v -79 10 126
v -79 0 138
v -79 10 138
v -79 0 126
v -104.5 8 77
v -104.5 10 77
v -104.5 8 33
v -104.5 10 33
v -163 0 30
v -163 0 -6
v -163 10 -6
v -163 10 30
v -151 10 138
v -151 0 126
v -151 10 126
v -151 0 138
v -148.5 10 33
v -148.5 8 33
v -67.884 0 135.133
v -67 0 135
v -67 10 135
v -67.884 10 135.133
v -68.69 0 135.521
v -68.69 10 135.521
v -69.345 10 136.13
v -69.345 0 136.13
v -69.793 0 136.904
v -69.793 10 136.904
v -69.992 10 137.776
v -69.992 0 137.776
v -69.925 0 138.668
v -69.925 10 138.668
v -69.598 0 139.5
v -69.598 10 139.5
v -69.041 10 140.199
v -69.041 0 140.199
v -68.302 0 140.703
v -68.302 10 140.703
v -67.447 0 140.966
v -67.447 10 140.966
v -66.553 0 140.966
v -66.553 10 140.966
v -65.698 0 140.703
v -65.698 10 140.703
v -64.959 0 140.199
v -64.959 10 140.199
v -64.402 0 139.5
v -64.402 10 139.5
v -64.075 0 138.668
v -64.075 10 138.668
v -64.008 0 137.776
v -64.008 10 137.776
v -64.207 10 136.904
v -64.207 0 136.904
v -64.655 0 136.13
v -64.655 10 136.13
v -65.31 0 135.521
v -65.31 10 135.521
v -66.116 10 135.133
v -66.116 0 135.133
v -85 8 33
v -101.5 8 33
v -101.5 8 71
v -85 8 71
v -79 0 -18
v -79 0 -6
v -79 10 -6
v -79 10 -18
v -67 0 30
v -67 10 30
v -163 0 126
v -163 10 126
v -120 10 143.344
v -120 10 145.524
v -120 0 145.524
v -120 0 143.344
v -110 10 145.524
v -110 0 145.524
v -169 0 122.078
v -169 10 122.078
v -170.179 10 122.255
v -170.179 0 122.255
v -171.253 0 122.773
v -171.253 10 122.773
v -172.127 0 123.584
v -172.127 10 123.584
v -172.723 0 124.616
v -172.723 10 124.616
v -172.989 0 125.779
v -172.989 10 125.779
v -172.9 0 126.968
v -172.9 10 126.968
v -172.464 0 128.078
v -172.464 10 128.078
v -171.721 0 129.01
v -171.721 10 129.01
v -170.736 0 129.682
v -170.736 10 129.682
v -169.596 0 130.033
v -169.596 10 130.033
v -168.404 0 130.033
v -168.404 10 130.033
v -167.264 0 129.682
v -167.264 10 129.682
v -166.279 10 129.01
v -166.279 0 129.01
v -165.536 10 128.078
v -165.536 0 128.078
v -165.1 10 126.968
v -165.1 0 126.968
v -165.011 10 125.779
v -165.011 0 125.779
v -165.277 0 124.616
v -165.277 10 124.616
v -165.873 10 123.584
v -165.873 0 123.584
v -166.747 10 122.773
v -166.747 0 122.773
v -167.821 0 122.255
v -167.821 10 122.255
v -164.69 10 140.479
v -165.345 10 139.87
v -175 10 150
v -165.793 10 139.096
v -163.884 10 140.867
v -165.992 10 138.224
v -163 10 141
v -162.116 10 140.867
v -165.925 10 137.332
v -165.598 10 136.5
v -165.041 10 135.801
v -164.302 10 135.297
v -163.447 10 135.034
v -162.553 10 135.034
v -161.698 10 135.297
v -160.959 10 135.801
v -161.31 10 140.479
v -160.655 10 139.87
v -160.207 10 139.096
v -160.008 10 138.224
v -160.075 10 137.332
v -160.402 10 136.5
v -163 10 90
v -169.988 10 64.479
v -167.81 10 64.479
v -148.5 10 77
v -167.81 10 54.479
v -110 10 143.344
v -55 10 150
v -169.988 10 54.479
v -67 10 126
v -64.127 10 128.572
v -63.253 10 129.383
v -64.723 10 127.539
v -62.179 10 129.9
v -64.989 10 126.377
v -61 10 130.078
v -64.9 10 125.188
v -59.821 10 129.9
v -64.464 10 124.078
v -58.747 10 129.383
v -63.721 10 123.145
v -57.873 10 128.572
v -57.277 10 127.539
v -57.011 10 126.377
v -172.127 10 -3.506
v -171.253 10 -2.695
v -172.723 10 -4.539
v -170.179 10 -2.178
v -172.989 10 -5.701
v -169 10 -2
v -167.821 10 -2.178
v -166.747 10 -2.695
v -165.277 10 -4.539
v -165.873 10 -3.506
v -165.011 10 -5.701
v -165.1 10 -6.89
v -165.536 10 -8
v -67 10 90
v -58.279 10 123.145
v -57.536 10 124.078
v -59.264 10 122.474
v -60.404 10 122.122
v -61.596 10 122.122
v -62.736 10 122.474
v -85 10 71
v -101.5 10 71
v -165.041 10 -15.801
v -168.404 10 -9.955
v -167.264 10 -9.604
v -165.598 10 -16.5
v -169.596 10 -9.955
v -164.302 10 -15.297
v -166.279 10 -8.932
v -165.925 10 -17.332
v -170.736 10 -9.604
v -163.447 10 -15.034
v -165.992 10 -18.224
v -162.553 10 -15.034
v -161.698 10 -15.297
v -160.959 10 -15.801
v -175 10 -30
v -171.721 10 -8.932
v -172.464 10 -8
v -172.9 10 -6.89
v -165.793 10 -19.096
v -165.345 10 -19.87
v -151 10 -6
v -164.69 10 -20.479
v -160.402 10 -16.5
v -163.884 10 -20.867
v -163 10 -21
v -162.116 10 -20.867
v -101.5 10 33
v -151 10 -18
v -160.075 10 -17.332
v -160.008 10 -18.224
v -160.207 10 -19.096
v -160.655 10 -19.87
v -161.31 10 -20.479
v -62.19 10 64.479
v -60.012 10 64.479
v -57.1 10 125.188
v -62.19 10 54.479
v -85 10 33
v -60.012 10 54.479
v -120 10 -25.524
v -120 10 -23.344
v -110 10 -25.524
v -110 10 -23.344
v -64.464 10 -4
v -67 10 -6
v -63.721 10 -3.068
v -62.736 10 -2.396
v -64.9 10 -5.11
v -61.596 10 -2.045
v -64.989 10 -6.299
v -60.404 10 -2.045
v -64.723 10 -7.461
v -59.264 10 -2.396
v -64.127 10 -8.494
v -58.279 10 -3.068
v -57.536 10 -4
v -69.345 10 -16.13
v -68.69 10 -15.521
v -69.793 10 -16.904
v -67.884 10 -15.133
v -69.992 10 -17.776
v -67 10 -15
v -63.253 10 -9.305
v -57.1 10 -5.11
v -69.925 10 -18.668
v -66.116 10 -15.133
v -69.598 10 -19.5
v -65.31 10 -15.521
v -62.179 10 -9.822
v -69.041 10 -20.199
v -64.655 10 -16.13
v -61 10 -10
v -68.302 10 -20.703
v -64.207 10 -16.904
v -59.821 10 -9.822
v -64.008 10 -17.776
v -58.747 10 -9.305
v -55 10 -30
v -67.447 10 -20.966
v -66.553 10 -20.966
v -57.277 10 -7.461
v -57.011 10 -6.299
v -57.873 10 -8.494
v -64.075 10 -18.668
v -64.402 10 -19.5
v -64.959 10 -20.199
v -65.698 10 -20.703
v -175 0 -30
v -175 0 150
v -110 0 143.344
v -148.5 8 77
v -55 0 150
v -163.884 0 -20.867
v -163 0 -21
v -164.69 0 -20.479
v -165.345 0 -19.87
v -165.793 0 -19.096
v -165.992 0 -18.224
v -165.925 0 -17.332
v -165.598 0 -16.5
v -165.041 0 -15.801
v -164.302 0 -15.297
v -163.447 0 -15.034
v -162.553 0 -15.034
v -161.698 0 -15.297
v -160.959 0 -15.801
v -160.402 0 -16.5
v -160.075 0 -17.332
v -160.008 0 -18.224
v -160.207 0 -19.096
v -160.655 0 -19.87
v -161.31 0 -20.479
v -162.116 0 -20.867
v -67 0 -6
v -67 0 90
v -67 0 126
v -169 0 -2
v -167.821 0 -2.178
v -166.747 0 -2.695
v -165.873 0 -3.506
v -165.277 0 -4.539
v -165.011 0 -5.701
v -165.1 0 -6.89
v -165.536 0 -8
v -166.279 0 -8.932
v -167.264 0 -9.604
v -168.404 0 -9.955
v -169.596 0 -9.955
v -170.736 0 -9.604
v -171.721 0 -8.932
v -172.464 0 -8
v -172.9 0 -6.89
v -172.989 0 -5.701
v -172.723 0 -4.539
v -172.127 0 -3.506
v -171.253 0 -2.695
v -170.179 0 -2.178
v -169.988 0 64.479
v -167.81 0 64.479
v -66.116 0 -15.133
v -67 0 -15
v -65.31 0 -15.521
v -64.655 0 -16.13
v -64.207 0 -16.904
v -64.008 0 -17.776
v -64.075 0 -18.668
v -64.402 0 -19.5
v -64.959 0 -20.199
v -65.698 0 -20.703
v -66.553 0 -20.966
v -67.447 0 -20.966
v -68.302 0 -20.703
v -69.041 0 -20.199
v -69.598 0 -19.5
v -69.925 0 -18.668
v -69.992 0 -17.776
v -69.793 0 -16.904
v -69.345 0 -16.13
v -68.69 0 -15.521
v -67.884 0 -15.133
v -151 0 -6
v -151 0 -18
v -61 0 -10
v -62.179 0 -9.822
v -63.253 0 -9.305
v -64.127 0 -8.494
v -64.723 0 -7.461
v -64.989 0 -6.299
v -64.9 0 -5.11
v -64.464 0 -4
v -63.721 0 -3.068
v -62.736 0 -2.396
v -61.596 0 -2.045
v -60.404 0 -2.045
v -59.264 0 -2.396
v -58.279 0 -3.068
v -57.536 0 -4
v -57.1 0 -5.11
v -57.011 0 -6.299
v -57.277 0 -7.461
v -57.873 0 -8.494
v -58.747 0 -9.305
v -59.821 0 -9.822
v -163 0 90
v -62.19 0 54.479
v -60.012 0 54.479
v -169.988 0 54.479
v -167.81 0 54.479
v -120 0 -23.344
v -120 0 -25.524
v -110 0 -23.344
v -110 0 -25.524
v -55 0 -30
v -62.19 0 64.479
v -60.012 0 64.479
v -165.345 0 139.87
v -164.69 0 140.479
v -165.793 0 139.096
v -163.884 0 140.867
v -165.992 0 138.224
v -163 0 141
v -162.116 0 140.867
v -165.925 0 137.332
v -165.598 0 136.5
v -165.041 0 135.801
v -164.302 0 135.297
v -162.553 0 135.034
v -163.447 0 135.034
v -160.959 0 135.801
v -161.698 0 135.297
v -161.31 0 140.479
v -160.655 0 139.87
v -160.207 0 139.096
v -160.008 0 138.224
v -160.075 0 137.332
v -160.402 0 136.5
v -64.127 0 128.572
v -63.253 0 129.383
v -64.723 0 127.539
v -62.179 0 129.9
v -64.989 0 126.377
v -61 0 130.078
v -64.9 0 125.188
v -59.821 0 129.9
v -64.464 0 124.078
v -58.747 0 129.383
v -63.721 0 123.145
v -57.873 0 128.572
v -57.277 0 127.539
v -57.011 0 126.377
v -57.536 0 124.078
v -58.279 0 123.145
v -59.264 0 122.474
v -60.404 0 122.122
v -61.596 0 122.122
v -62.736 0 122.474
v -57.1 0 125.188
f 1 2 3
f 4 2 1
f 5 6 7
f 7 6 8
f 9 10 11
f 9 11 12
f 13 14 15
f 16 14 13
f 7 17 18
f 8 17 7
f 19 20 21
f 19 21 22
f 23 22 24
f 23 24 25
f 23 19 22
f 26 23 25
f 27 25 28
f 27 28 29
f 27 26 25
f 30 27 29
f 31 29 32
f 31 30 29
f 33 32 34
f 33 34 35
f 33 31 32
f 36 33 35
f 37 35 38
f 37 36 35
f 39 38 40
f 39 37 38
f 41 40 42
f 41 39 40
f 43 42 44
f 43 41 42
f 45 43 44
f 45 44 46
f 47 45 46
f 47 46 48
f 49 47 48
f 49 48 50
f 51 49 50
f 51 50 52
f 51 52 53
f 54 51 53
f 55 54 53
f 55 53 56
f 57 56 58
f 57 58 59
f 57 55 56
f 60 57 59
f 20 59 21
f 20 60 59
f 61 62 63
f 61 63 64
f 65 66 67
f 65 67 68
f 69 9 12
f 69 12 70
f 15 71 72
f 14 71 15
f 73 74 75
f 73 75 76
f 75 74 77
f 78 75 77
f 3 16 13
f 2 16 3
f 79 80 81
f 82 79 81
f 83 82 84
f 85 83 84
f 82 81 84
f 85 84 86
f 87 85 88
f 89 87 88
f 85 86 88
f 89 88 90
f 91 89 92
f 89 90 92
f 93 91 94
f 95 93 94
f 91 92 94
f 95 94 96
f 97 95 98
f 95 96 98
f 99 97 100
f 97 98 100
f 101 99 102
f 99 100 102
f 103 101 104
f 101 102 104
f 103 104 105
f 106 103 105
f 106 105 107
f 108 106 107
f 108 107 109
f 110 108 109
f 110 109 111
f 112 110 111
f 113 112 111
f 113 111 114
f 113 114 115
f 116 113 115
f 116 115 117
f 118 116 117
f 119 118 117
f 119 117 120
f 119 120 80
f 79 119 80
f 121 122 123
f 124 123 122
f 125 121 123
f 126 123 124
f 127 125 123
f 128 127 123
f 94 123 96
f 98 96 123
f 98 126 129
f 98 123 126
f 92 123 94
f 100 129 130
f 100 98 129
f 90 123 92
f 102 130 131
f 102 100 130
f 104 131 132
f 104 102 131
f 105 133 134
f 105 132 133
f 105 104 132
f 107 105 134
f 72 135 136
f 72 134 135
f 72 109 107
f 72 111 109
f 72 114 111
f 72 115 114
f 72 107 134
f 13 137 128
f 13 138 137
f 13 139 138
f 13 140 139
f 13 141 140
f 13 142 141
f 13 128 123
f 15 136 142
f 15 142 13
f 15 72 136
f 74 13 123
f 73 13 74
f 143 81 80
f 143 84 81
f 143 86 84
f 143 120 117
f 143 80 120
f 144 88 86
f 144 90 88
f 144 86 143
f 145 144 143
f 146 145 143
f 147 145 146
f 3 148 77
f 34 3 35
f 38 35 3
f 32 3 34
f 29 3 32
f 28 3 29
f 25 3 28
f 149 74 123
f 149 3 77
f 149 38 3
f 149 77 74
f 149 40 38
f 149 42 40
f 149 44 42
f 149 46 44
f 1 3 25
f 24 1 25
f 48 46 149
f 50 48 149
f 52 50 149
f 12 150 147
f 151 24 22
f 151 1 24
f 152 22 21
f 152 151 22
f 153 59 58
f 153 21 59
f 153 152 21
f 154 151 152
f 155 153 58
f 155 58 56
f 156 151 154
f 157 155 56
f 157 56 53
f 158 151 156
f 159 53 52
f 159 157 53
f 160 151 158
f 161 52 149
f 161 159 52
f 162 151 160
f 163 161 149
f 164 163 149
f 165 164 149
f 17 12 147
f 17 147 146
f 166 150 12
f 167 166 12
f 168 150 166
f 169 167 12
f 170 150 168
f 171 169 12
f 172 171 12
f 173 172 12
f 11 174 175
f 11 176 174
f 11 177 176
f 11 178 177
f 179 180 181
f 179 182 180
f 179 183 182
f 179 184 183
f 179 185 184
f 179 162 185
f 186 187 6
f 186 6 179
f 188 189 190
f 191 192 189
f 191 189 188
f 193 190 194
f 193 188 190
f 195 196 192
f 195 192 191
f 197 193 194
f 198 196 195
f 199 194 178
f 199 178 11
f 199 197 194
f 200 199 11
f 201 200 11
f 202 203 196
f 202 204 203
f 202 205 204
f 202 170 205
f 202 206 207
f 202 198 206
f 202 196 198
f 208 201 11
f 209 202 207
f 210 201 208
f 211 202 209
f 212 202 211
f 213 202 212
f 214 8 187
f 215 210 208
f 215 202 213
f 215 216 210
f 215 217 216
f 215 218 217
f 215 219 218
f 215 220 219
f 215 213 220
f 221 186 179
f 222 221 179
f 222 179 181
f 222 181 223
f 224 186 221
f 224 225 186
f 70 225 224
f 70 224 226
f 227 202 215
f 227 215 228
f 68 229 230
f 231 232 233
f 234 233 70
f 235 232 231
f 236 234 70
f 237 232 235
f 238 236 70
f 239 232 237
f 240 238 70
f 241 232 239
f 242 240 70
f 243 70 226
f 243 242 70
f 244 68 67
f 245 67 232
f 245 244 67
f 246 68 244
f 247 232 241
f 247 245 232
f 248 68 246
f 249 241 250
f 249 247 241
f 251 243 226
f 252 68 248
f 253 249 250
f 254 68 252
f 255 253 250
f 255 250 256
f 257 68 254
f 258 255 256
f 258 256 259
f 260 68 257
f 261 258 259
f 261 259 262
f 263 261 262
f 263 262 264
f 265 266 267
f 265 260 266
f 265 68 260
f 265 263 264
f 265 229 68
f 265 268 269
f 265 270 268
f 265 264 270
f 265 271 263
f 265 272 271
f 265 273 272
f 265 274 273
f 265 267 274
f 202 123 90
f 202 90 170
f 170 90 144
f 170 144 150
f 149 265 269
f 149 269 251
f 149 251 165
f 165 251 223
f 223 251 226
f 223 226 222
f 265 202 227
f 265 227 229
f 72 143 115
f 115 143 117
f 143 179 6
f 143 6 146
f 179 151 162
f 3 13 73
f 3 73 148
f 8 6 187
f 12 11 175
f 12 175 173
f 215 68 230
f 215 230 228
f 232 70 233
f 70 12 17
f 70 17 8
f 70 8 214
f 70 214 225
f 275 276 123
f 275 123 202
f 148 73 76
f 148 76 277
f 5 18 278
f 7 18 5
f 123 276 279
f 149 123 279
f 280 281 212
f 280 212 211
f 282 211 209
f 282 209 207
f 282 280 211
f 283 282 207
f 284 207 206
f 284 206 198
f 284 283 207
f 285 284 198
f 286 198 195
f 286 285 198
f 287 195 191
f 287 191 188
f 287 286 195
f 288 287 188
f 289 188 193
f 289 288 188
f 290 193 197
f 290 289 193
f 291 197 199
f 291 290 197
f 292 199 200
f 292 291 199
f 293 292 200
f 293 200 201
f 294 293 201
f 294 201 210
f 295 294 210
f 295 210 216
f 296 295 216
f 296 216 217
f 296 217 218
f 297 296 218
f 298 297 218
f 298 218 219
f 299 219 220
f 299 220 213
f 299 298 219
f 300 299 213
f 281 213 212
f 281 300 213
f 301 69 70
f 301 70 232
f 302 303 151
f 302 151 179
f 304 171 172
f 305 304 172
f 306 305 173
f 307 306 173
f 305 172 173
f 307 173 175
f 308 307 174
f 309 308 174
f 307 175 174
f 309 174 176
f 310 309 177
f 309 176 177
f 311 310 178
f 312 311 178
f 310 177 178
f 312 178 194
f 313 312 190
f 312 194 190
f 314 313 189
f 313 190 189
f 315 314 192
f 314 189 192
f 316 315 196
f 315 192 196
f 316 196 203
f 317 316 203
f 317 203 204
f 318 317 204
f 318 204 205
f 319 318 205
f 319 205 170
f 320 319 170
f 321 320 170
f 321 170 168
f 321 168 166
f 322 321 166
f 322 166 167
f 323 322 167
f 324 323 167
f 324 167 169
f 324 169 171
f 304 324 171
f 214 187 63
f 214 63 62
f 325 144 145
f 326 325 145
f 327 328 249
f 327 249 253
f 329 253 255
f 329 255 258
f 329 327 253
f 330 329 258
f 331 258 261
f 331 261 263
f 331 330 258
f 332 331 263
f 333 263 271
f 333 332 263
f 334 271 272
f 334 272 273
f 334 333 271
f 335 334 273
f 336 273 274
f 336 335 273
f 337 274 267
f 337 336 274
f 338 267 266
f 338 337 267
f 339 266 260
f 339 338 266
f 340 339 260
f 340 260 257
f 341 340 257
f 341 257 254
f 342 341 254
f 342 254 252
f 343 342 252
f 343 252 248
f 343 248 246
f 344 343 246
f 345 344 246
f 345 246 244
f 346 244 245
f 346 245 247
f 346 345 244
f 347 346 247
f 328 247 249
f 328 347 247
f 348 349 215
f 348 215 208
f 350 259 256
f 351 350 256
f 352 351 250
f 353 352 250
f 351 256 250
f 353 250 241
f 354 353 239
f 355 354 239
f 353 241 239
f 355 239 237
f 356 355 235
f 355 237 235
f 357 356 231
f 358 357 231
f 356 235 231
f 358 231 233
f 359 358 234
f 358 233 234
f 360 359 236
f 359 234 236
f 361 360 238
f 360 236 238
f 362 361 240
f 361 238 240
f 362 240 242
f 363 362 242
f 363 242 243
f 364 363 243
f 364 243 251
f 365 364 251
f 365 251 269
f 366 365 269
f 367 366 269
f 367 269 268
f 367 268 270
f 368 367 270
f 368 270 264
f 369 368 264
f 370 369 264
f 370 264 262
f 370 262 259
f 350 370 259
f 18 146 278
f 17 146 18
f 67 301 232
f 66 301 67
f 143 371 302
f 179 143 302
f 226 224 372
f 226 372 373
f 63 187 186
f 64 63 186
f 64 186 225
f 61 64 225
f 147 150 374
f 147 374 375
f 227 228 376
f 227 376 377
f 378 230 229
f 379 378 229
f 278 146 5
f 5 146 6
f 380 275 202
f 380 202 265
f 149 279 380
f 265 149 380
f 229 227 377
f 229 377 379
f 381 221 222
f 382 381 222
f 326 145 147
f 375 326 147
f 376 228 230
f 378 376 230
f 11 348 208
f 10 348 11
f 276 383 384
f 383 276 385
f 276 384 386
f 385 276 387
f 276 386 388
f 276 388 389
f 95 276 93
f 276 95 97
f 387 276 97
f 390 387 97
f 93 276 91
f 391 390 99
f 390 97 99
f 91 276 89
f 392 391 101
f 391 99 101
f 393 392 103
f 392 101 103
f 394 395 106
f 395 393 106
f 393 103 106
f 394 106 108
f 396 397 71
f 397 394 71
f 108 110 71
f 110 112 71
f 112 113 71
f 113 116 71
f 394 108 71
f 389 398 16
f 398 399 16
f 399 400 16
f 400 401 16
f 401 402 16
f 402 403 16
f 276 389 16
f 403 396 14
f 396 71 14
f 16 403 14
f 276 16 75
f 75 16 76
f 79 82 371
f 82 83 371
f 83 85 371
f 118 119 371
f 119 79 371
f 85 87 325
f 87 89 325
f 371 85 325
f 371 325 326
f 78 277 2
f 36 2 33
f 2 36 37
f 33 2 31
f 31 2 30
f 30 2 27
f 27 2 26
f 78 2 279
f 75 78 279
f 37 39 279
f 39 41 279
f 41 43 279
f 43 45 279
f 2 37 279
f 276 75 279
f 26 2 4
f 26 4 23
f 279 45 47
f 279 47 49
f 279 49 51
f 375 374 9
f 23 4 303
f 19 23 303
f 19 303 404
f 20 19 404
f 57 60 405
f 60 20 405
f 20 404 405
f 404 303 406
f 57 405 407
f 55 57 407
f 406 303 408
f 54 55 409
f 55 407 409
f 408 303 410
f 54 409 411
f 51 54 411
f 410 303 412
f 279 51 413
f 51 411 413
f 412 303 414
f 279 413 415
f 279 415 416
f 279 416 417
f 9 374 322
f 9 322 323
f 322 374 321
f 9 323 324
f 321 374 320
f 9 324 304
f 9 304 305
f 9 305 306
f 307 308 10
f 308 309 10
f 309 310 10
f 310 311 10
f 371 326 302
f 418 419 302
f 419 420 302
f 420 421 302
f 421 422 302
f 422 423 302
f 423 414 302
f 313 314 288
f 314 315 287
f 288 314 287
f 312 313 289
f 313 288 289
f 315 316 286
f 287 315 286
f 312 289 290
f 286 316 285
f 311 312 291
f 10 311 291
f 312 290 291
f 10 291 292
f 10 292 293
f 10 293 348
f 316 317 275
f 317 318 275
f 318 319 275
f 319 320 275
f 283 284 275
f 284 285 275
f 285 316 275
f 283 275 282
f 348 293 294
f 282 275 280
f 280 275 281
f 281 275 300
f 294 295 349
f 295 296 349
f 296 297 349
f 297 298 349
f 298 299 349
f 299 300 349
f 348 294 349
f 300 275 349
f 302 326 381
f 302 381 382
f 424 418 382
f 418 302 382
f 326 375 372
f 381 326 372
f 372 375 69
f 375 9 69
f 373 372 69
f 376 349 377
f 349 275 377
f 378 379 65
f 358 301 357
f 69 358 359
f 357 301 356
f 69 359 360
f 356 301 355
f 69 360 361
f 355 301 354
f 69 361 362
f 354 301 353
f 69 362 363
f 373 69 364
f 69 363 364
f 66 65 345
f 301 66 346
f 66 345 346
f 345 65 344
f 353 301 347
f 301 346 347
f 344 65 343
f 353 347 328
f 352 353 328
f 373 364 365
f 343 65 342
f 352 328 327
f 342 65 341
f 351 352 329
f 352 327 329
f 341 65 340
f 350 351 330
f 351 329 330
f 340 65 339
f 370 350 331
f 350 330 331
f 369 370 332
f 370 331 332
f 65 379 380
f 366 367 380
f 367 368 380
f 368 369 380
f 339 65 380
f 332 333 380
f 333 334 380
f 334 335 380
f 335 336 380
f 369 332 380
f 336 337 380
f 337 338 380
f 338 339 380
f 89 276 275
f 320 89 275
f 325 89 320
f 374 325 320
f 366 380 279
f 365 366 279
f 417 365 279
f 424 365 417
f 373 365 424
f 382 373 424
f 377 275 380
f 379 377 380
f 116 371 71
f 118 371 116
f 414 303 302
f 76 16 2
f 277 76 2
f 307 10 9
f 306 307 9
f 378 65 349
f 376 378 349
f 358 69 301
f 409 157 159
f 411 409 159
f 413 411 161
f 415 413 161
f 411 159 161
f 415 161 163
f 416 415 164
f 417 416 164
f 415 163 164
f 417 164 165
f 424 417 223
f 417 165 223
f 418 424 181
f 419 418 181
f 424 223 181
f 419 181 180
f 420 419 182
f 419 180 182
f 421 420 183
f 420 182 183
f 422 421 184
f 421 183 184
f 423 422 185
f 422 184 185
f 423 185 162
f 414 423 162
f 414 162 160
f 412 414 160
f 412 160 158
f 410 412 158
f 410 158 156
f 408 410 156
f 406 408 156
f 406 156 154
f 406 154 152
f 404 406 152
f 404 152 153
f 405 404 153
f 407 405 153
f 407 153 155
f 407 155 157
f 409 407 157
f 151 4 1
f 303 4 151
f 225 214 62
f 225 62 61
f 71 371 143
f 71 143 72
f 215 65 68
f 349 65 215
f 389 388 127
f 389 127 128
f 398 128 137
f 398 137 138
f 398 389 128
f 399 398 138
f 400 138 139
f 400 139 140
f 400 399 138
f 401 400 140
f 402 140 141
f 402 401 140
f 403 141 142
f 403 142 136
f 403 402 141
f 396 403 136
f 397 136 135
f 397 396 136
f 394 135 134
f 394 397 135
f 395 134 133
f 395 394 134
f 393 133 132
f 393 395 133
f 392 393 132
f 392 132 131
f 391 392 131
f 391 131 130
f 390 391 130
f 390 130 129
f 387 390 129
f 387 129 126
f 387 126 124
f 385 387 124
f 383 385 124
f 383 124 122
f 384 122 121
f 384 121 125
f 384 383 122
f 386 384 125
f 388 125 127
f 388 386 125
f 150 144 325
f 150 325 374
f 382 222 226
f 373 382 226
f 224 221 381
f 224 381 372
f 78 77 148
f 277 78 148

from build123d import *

# Parameters (mm, degrees)
SKETCH1_W           = 120
SKETCH1_H           = 180
SKETCH1_R           = 3
BOSS_EXTRUDE1_DEPTH = 10
SKETCH2_W           = 96
SKETCH2_H           = 60
BOSS_EXTRUDE2_DEPTH = 10
SKETCH8_R           = 4
SKETCH8_W           = 2.177957771
SKETCH8_H           = 10
SKETCH8_W_2         = 10
SKETCH8_H_2         = 2.18
CUT_EXTRUDE8_DEPTH  = 231.705439901
SKETCH7_W           = 16.5
SKETCH7_H           = 38
CUT_EXTRUDE7_DEPTH  = 2
SKETCH5_W           = 44
SKETCH5_H           = 44
CUT_EXTRUDE5_DEPTH  = 2


with BuildPart() as part:
    # Sketch1 → Boss-Extrude1 (new body)
    with BuildSketch(Plane(origin=(0, 0, 0), x_dir=(1, 0, 0), z_dir=(0, 1, 0))):
        with Locations((-115, -60)):
            Rectangle(SKETCH1_W, SKETCH1_H)
        with Locations(Location((-163, -138, 0), (0, 0, 270))):
            Circle(SKETCH1_R, mode=Mode.SUBTRACT)
        with Locations(Location((-67, -138, 0), (0, 0, 90))):
            Circle(SKETCH1_R, mode=Mode.SUBTRACT)
        with Locations(Location((-163, 18, 0), (0, 0, 90))):
            Circle(SKETCH1_R, mode=Mode.SUBTRACT)
        with Locations(Location((-67, 18, 0), (0, 0, 270))):
            Circle(SKETCH1_R, mode=Mode.SUBTRACT)
        Polygon((-163, 6), (-163, -126), (-151, -126), (-151, -138), (-79, -138), (-79, -126), (-67, -126), (-67, 6), (-79, 6), (-79, 18), (-151, 18), (-151, 6), align=None, mode=Mode.SUBTRACT)
    extrude(amount=BOSS_EXTRUDE1_DEPTH)

    # Sketch2 → Boss-Extrude2 (add)
    with BuildSketch(Plane(origin=(0, 0, 0), x_dir=(1, 0, 0), z_dir=(0, 1, 0))):
        with Locations((-115, -60)):
            Rectangle(SKETCH2_W, SKETCH2_H)
    extrude(amount=BOSS_EXTRUDE2_DEPTH)

    # Sketch8 → Cut-Extrude8 (cut, through all)
    with BuildSketch(Plane(origin=(0, 10, 0), x_dir=(1, 0, 0), z_dir=(0, 1, 0))):
        with Locations(Location((-169, 6, 0), (0, 0, 270))):
            Circle(SKETCH8_R)
        with Locations(Location((-169, -126.077692428, 0), (0, 0, 90))):
            Circle(SKETCH8_R)
        with Locations(Location((-61, -126.077692428, 0), (0, 0, 270))):
            Circle(SKETCH8_R)
        with Locations(Location((-61, 6, 0), (0, 0, 90))):
            Circle(SKETCH8_R)
        with Locations((-168.898595302, -59.479320644)):
            Rectangle(SKETCH8_W, SKETCH8_H)
        with Locations((-115, 24.434155691)):
            Rectangle(SKETCH8_W_2, SKETCH8_H_2)
        with Locations((-61.101404698, -59.479320644)):
            Rectangle(SKETCH8_W, SKETCH8_H)
        with Locations((-115, -144.434155691)):
            Rectangle(SKETCH8_W_2, SKETCH8_H_2)
    extrude(amount=-CUT_EXTRUDE8_DEPTH, mode=Mode.SUBTRACT)

    # Sketch7 → Cut-Extrude7 (cut)
    with BuildSketch(Plane(origin=(0, 10, 0), x_dir=(1, 0, 0), z_dir=(0, 1, 0))):
        with Locations((-93.25, -52)):
            Rectangle(SKETCH7_W, SKETCH7_H)
    extrude(amount=-CUT_EXTRUDE7_DEPTH, mode=Mode.SUBTRACT)

    # Sketch5 → Cut-Extrude5 (cut)
    with BuildSketch(Plane(origin=(0, 10, 0), x_dir=(1, 0, 0), z_dir=(0, 1, 0))):
        with Locations((-126.5, -55)):
            Rectangle(SKETCH5_W, SKETCH5_H)
    extrude(amount=-CUT_EXTRUDE5_DEPTH, mode=Mode.SUBTRACT)


solid = part.part
